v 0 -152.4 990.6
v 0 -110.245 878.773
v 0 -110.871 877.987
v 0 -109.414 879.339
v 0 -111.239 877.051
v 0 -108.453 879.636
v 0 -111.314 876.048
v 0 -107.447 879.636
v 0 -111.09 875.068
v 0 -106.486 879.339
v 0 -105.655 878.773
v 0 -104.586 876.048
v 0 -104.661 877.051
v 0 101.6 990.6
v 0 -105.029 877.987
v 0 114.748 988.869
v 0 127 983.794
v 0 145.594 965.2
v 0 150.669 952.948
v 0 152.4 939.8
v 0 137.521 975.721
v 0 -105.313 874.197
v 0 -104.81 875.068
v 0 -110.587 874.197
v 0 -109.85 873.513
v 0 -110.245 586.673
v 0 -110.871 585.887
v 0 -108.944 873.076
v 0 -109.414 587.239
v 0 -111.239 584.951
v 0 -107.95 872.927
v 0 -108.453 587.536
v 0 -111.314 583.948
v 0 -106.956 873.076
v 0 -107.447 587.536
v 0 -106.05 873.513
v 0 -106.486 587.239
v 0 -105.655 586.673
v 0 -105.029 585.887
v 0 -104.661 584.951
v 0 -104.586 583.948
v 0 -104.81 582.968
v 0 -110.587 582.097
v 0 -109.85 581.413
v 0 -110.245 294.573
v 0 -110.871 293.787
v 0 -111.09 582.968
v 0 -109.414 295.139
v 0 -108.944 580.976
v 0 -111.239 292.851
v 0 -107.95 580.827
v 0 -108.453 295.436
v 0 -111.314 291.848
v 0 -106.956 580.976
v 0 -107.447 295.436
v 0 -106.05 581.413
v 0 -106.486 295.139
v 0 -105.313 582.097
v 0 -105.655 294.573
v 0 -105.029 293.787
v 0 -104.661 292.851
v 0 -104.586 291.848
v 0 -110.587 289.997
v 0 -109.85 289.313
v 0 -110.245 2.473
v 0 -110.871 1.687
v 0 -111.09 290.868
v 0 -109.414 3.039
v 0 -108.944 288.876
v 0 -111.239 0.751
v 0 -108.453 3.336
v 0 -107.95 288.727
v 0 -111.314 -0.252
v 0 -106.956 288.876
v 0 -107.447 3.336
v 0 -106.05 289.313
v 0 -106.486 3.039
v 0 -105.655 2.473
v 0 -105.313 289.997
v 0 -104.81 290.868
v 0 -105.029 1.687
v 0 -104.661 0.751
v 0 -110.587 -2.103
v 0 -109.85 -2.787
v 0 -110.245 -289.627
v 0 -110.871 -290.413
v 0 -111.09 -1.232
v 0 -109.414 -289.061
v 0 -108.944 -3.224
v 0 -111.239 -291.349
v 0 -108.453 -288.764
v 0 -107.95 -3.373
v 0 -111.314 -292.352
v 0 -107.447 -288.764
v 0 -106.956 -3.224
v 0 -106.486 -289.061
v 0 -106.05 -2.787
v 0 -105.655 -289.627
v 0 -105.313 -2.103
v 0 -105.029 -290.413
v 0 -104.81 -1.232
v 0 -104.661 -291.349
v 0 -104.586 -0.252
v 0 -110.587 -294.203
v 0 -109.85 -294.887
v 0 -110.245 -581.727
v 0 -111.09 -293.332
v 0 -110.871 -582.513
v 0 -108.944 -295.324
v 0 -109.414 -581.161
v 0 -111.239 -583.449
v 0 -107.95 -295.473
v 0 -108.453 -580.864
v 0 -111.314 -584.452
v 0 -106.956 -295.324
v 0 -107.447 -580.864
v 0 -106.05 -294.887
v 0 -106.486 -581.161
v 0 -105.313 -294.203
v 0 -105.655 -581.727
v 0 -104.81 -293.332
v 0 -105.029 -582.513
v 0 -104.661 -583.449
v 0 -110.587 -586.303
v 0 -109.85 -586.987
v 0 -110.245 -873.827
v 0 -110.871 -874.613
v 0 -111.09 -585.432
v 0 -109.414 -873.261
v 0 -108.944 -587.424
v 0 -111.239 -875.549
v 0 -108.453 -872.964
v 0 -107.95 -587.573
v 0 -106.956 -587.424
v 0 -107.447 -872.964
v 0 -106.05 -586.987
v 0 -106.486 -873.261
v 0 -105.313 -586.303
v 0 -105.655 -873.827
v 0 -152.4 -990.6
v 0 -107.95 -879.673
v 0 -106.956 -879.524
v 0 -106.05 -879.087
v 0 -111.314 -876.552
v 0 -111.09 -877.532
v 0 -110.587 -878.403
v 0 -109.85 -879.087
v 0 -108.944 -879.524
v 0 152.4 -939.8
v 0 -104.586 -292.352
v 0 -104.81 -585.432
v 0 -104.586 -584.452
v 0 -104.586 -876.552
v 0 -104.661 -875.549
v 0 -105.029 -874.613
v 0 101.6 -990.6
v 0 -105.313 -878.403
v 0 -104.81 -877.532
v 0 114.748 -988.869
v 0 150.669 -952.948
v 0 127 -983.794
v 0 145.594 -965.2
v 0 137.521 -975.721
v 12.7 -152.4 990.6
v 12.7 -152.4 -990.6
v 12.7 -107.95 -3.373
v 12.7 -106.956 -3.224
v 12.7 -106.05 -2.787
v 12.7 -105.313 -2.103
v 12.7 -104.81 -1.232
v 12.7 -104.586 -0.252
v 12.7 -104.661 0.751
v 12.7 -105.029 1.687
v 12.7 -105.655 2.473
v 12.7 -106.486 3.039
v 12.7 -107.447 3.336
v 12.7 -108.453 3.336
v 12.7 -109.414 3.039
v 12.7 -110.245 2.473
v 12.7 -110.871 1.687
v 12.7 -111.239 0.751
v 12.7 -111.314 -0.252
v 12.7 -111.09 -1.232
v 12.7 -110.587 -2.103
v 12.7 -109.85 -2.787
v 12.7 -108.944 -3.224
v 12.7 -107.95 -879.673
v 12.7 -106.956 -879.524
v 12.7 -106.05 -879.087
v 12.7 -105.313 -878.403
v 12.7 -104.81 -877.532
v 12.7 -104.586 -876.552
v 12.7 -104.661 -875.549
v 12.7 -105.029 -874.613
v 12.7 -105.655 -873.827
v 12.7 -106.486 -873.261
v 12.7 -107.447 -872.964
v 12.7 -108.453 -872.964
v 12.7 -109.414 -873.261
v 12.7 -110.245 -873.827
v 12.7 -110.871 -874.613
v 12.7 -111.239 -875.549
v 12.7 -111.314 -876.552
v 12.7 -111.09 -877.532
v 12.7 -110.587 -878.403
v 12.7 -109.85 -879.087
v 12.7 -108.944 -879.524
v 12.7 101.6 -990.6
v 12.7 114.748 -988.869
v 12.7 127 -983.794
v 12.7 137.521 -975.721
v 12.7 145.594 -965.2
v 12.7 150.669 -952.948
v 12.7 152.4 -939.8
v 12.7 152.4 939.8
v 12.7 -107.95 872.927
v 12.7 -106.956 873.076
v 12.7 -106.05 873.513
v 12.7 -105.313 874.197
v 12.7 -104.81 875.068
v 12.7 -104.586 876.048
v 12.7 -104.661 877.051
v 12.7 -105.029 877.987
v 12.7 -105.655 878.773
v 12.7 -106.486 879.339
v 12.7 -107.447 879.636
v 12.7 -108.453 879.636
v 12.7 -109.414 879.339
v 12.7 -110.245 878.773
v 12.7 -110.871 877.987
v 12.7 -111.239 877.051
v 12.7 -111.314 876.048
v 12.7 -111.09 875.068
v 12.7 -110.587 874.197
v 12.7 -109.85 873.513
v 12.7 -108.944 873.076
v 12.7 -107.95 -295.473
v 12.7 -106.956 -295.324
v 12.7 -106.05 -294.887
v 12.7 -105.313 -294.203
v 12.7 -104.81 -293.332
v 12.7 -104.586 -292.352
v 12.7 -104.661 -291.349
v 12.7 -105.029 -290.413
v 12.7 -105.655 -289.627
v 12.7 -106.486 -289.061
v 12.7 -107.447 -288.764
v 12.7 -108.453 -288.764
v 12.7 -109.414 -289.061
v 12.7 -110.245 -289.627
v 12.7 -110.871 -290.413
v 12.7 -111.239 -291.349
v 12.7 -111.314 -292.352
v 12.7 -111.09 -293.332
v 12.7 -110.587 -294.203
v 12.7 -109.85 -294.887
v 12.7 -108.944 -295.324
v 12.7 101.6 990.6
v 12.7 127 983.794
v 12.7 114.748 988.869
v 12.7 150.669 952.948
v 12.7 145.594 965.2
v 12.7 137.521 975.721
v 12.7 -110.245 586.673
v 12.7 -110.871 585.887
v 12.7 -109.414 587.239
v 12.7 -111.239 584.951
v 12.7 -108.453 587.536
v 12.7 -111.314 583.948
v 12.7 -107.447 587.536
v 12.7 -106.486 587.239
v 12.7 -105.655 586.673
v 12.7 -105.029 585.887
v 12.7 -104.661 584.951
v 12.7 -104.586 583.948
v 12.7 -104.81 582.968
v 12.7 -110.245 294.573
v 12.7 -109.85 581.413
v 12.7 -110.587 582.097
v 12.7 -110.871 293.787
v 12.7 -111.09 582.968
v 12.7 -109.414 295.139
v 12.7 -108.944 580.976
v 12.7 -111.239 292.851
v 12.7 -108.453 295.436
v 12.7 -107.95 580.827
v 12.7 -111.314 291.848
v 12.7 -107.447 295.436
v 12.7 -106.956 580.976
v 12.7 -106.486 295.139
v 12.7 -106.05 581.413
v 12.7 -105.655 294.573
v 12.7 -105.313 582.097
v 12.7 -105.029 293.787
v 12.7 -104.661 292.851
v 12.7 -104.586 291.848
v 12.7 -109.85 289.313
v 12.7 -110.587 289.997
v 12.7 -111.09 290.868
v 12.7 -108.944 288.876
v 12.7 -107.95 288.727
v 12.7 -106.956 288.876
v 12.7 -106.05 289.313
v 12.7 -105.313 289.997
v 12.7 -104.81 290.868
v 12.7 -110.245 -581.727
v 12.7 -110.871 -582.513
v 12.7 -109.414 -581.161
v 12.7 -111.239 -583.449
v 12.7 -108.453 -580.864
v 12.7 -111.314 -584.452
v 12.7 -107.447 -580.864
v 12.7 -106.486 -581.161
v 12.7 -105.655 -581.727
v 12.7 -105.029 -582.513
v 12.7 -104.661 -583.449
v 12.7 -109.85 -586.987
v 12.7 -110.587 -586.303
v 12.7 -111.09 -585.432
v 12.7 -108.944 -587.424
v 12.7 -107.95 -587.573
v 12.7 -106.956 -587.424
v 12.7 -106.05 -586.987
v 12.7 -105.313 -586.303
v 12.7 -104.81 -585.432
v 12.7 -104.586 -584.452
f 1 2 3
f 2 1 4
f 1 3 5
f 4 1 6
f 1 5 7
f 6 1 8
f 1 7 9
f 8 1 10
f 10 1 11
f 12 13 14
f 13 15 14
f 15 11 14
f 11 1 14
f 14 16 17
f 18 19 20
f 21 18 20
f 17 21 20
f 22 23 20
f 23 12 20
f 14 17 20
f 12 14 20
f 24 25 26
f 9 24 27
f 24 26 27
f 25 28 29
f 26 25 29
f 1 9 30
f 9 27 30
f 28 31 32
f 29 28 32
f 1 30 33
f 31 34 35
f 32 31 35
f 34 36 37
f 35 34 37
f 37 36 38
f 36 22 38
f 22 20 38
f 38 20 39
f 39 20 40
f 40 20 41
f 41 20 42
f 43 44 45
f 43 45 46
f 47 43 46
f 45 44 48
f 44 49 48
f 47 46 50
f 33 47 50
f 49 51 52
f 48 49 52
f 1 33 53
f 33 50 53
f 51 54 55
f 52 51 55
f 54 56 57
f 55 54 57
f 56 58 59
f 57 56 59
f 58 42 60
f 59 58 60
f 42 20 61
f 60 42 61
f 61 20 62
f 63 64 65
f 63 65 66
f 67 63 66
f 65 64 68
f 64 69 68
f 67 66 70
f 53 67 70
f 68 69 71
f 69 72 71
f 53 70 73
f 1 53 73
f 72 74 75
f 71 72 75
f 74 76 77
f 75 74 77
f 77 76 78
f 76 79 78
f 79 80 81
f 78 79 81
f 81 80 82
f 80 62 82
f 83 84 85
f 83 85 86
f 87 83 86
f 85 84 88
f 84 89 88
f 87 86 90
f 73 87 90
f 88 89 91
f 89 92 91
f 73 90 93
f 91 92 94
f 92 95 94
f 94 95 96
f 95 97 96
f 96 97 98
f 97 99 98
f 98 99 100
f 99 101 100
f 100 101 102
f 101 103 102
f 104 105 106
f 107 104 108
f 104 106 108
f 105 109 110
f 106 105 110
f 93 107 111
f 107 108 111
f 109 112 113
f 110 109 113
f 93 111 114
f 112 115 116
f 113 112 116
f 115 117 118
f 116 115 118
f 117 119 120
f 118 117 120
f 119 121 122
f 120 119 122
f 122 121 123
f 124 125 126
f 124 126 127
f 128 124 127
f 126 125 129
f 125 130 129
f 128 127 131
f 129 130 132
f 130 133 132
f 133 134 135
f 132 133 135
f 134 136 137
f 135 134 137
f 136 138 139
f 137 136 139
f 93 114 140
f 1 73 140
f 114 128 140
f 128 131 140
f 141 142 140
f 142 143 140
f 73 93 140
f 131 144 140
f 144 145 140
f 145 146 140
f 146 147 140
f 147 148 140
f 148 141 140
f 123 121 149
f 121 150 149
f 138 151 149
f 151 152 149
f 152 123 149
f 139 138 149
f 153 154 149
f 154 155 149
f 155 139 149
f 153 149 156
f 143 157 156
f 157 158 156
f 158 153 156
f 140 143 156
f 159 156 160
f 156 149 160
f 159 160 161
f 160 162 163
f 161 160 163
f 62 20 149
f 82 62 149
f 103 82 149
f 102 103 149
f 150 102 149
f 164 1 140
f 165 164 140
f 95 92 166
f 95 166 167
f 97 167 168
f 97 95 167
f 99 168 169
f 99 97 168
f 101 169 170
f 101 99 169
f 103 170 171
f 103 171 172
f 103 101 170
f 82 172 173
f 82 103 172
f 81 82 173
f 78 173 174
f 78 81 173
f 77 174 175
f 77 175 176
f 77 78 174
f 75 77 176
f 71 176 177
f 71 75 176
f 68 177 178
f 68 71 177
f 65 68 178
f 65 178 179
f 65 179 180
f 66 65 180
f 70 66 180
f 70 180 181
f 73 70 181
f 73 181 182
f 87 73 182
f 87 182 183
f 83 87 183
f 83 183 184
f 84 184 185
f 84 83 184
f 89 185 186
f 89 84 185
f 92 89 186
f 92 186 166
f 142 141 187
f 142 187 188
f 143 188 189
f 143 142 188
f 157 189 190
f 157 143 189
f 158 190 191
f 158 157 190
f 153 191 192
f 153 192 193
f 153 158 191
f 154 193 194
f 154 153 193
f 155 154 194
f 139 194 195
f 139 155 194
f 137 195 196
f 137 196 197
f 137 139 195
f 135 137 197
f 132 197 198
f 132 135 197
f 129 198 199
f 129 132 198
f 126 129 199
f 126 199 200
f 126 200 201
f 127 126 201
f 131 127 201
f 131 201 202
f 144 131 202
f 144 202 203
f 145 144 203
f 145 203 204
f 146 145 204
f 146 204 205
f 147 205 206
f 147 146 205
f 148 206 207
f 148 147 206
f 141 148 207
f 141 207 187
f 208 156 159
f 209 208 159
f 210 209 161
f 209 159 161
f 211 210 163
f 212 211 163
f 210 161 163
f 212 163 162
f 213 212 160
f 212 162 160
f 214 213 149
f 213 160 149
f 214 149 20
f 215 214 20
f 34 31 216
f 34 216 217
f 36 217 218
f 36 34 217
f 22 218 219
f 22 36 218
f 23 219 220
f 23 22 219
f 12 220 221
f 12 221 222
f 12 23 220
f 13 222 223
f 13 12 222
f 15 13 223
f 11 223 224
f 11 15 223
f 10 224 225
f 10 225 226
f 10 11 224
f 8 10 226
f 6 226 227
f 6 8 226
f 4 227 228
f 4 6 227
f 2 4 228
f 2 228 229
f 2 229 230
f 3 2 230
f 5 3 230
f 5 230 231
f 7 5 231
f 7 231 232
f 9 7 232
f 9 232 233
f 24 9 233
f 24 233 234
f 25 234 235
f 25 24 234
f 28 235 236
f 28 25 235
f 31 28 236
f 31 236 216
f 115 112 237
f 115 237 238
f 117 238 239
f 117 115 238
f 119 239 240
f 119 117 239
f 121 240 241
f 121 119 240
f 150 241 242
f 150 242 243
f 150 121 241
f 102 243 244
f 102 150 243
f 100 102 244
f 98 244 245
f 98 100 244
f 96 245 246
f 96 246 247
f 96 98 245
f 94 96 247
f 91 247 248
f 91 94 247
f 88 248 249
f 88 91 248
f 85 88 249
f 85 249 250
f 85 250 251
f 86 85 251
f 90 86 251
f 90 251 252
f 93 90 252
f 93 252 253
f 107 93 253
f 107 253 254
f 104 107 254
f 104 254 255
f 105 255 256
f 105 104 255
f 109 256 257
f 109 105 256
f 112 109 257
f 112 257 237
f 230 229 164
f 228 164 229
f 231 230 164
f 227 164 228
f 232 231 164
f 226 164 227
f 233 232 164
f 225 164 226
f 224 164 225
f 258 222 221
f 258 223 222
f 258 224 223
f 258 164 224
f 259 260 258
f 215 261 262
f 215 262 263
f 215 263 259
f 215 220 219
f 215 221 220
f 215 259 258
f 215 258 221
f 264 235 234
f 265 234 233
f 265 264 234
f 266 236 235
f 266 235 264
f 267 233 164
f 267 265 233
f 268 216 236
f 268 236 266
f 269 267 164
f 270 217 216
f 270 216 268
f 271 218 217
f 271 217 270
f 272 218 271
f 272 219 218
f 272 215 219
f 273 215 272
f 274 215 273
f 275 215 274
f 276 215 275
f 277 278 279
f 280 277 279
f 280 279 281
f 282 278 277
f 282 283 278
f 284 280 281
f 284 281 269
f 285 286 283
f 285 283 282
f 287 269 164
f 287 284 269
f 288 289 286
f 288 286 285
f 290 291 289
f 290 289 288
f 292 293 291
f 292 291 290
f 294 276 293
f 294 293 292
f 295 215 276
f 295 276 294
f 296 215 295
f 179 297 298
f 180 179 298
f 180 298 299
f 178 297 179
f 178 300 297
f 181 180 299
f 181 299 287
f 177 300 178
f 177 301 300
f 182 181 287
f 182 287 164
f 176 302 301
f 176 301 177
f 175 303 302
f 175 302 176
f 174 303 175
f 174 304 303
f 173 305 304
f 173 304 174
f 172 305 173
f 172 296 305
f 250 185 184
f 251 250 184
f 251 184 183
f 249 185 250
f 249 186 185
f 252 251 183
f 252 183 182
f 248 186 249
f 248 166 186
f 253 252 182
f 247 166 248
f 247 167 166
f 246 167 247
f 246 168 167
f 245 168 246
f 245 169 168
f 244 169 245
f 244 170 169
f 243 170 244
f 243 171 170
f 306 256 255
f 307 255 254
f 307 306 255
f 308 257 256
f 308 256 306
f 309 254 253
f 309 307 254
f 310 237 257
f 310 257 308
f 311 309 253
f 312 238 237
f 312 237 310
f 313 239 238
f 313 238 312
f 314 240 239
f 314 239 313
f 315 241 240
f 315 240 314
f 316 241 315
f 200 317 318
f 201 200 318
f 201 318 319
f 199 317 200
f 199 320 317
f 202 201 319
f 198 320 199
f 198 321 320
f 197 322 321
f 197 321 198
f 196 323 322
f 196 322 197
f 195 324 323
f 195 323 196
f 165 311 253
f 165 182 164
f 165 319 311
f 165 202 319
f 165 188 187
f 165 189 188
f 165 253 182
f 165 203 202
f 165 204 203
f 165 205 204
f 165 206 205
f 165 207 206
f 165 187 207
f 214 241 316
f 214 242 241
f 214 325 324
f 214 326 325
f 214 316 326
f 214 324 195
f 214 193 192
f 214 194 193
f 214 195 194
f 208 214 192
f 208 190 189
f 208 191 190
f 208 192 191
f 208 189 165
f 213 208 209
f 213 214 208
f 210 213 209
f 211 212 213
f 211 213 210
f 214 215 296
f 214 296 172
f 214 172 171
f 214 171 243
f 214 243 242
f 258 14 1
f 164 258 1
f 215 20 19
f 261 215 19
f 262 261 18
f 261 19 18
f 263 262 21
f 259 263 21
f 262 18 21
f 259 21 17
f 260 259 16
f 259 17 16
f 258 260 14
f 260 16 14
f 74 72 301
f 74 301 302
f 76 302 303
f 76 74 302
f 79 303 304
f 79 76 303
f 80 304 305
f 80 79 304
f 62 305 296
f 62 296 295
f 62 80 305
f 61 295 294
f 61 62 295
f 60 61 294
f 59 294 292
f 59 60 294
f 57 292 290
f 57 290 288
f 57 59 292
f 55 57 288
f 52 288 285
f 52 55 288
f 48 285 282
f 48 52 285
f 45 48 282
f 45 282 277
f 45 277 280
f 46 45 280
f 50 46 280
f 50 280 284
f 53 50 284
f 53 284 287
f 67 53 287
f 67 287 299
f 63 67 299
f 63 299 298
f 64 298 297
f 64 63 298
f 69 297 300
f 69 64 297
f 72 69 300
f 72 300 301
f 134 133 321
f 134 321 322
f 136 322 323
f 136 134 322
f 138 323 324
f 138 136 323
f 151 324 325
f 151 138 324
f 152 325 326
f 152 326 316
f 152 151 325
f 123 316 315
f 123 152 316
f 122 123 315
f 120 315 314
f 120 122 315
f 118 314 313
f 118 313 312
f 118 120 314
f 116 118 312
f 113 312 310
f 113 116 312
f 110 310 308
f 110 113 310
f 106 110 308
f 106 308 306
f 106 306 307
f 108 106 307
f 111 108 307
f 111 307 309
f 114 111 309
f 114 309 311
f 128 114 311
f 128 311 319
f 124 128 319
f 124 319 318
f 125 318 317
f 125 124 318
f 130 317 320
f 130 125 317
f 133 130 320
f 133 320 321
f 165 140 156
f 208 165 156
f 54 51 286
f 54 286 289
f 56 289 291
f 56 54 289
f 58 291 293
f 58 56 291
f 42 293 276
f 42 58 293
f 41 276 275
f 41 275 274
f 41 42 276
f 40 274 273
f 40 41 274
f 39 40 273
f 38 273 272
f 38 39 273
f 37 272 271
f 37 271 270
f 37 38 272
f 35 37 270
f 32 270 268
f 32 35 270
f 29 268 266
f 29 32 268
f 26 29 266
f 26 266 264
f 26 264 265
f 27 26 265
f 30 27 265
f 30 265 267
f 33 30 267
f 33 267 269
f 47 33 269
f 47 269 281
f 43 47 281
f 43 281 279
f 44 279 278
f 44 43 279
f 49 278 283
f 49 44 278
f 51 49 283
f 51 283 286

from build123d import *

# Parameters (mm, degrees)
SKETCH1_R           = 3.3734375
BOSS_EXTRUDE1_DEPTH = 12.7


with BuildPart() as part:
    # Sketch1 → Boss-Extrude1 (new body)
    with BuildSketch(Plane(origin=(0, 0, 0), x_dir=(0, 0, -1), z_dir=(1, 0, 0))):
        with BuildLine():
            Line((-990.6, -152.4), (990.6, -152.4))
            Line((990.6, -152.4), (990.6, 101.6))
            ThreePointArc((990.6, 101.6), (975.721024484, 137.521024484), (939.8, 152.4))
            Line((939.8, 152.4), (-939.8, 152.4))
            ThreePointArc((-939.8, 152.4), (-975.721024484, 137.521024484), (-990.6, 101.6))
            Line((-990.6, 101.6), (-990.6, -152.4))
        make_face()
        with Locations((-876.3, -107.95)):
            Circle(SKETCH1_R, mode=Mode.SUBTRACT)
        with Locations((-584.2, -107.95)):
            Circle(SKETCH1_R, mode=Mode.SUBTRACT)
        with Locations((-292.1, -107.95)):
            Circle(SKETCH1_R, mode=Mode.SUBTRACT)
        with Locations((0, -107.95)):
            Circle(SKETCH1_R, mode=Mode.SUBTRACT)
        with Locations((292.1, -107.95)):
            Circle(SKETCH1_R, mode=Mode.SUBTRACT)
        with Locations((584.2, -107.95)):
            Circle(SKETCH1_R, mode=Mode.SUBTRACT)
        with Locations((876.3, -107.95)):
            Circle(SKETCH1_R, mode=Mode.SUBTRACT)
    extrude(amount=BOSS_EXTRUDE1_DEPTH)


solid = part.part
